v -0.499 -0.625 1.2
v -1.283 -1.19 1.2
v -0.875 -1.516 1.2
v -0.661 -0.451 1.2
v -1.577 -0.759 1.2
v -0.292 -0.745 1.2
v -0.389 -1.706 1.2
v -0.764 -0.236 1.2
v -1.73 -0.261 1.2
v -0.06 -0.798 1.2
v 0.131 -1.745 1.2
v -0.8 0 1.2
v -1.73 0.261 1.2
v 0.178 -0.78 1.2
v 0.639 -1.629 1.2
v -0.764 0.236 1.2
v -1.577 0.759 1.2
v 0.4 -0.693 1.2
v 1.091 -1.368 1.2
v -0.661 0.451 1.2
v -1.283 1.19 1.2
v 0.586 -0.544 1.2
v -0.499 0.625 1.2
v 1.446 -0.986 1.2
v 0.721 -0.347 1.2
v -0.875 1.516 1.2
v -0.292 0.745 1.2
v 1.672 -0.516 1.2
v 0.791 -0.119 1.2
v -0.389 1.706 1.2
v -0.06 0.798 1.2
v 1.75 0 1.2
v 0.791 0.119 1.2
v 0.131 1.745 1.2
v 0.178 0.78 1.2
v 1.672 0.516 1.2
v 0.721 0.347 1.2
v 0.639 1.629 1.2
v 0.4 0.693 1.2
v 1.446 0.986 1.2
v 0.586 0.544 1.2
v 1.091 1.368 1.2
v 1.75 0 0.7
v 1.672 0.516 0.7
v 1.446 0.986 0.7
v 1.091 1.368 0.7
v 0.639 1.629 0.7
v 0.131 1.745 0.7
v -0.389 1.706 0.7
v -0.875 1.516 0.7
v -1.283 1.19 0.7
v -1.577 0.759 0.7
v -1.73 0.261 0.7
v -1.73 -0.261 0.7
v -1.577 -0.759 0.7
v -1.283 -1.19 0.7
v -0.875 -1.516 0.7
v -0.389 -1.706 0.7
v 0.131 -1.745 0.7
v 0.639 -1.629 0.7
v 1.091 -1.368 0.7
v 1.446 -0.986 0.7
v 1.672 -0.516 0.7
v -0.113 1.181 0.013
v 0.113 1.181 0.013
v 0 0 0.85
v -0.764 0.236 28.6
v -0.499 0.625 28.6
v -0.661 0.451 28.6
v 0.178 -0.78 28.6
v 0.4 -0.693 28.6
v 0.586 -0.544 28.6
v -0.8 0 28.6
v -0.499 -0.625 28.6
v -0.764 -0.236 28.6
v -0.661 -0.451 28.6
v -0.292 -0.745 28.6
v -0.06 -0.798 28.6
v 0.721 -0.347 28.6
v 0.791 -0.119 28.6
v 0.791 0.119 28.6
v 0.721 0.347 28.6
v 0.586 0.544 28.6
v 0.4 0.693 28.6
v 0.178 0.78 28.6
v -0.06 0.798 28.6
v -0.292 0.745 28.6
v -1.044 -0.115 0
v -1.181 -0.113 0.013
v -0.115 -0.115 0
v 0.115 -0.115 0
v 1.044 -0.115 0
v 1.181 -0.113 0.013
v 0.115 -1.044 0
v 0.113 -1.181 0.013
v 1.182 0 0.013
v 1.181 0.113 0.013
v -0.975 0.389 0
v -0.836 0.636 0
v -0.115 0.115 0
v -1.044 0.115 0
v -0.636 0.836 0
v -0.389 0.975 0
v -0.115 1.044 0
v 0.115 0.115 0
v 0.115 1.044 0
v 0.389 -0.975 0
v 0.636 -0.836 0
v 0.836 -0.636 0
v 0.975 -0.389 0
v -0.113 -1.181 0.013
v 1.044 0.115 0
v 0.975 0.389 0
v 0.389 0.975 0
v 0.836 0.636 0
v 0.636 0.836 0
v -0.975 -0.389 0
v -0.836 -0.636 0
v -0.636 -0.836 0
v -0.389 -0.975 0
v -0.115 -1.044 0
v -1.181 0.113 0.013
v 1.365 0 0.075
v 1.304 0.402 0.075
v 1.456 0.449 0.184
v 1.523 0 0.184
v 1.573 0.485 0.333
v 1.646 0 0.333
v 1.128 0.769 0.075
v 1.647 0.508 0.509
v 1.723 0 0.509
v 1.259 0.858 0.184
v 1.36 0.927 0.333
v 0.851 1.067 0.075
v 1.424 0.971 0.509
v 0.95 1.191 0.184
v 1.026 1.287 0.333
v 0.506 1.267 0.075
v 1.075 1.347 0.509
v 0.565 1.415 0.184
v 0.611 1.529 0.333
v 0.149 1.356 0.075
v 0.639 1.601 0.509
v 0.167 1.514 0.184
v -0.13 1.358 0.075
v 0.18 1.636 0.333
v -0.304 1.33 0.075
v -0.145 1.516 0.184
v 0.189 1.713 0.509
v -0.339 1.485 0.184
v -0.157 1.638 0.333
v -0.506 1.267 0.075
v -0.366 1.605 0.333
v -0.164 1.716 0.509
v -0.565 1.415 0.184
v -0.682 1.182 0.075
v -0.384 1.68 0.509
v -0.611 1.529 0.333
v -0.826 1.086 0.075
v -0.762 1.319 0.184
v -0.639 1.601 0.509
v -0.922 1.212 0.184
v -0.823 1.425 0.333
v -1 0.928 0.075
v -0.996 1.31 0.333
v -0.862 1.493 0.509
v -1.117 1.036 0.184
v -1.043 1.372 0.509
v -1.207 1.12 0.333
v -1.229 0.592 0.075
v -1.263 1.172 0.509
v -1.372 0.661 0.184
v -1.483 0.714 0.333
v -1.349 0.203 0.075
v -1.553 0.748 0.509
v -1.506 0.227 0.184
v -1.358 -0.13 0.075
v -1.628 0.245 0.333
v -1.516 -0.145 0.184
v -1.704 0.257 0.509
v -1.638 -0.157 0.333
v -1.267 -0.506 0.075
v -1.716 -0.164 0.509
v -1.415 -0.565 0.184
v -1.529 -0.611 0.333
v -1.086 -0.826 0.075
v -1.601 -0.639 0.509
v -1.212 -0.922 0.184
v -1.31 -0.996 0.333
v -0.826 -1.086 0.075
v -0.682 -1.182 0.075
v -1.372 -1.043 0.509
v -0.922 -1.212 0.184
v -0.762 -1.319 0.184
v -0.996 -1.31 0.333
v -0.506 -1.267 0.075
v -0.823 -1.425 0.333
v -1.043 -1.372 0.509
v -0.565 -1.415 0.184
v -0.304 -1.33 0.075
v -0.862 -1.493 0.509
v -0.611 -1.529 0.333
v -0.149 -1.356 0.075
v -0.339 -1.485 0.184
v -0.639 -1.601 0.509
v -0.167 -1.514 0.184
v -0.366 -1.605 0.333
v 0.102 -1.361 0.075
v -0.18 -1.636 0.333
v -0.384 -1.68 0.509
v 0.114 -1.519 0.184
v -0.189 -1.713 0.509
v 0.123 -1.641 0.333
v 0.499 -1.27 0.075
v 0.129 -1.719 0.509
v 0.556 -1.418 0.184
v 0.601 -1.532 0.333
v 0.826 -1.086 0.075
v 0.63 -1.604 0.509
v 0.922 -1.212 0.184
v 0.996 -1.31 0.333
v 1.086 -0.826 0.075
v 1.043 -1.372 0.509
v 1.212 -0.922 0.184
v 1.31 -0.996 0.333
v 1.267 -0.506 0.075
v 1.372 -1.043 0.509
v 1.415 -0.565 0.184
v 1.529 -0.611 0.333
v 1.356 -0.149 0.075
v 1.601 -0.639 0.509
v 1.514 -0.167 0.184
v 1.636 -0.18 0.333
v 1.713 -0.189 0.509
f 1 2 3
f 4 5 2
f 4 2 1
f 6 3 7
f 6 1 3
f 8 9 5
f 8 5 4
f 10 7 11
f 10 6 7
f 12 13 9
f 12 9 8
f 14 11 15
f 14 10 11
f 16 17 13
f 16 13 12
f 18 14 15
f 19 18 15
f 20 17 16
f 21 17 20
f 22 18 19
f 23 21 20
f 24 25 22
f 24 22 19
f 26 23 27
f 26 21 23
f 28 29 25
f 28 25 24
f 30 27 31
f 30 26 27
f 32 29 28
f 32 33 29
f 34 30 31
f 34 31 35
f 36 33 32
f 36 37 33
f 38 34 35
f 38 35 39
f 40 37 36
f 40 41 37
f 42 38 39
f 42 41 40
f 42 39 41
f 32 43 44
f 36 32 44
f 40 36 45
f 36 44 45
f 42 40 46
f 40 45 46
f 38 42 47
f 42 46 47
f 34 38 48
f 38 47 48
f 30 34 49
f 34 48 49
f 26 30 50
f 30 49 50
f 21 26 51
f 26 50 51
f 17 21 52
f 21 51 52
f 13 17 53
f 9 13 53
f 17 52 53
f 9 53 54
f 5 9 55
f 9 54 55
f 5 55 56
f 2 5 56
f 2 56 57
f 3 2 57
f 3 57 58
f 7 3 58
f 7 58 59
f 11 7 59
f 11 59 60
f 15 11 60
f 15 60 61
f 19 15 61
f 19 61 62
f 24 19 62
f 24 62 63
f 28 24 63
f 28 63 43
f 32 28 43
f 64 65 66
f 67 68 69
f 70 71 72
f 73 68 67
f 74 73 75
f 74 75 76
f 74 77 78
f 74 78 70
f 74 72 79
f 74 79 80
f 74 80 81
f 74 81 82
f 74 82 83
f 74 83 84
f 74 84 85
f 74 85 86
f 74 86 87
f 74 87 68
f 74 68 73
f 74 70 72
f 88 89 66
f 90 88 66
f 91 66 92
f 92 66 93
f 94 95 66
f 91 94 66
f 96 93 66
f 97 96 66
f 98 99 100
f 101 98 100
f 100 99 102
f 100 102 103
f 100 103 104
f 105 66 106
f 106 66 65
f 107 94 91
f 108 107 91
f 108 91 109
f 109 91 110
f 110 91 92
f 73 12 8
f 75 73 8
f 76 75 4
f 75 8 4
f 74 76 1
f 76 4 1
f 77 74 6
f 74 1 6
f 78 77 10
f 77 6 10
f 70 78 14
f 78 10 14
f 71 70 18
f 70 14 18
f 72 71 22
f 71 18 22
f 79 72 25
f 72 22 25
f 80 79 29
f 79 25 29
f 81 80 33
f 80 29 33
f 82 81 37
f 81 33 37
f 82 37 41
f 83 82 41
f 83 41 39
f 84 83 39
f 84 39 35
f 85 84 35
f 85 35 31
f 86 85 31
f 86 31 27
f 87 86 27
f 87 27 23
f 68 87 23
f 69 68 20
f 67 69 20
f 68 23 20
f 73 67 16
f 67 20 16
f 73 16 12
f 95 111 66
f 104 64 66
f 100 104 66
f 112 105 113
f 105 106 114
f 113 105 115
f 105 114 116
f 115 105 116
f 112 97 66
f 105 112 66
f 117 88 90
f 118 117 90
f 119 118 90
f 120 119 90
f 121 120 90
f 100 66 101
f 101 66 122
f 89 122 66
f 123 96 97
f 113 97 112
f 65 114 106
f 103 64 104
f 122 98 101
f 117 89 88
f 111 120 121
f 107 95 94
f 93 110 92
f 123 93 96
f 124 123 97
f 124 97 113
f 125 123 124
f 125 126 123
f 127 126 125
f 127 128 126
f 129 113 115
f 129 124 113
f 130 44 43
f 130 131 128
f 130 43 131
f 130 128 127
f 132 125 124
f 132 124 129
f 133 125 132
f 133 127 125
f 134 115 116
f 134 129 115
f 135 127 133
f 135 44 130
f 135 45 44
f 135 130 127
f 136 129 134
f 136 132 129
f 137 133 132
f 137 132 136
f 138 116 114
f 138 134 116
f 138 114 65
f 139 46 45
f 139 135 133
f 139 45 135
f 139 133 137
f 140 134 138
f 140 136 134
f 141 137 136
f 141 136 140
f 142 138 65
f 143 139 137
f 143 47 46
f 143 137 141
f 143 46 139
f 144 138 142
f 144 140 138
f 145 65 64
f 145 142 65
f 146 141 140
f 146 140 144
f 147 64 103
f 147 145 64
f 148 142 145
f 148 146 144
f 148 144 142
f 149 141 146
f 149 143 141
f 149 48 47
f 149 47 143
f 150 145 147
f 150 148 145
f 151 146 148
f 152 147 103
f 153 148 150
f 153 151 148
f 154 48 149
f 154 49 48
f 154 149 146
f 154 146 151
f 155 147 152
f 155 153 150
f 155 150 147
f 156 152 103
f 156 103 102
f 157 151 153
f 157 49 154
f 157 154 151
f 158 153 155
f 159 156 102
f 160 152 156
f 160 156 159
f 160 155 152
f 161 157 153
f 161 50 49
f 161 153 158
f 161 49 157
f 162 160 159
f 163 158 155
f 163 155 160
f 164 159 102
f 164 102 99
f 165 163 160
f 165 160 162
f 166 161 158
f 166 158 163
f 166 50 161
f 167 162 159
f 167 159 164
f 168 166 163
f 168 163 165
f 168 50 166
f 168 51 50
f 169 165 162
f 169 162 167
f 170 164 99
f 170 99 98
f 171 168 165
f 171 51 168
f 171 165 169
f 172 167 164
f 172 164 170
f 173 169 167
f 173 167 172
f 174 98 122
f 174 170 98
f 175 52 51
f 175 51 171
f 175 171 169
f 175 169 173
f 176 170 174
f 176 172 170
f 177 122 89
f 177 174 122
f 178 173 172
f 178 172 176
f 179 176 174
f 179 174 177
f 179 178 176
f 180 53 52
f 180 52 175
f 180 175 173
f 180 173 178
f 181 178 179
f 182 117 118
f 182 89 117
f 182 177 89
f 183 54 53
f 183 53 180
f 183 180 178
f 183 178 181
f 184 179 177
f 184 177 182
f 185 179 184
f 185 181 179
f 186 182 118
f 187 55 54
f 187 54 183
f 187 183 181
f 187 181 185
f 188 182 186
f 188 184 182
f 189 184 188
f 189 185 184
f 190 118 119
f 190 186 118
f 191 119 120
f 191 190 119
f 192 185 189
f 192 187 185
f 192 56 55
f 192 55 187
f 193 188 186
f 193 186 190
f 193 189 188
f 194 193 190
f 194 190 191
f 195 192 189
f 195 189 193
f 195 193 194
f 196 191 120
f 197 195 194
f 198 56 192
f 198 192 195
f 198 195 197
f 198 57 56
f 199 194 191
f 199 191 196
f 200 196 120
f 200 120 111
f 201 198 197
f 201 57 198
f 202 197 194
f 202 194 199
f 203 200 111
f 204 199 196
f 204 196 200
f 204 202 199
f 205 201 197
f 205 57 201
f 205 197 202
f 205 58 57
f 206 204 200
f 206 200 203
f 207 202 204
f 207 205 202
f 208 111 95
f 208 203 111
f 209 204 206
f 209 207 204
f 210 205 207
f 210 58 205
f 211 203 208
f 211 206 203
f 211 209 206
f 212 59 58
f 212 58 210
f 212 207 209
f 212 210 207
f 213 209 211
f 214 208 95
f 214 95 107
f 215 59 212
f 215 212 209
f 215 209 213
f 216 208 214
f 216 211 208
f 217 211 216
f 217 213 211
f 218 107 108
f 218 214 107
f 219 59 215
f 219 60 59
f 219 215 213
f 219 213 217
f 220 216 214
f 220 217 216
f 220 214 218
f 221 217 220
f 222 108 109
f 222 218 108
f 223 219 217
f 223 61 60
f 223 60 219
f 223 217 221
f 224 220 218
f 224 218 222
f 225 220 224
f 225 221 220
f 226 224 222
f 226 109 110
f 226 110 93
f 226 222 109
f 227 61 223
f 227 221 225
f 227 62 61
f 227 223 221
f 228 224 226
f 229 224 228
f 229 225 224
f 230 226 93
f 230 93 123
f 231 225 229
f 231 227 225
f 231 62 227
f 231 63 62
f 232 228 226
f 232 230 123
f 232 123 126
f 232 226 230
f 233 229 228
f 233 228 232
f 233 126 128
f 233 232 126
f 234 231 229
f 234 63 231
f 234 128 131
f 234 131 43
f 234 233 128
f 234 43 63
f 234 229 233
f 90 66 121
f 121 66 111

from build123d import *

# Parameters (mm, degrees)
SKETCH_1_R               = 1.75
EXTRUDE_1_DEPTH          = 1.2
SKETCH_2_R               = 0.8
EXTRUDE_2_DEPTH          = 27.4
PATTERN_CIRCULAR_1_COUNT = 4
FILLET_2_R               = 0.7


with BuildPart() as part:
    # 草圖1 → 伸長1 (new body)
    with BuildSketch(Plane.XY):
        Circle(SKETCH_1_R)
    extrude(amount=EXTRUDE_1_DEPTH)

    # 草圖2 → 伸長2 (add)
    with BuildSketch(Plane.XY.offset(1.2)):
        with Locations(Location((0, 0, 0), (0, 0, 180))):
            Circle(SKETCH_2_R)
    extrude(amount=EXTRUDE_2_DEPTH)

    # 草圖3 → 除料-疊層拉伸1 section 0
    with BuildSketch(Plane(origin=(0, 0, 0), x_dir=(-1, 0, 0), z_dir=(0, 0, -1)), mode=Mode.PRIVATE) as loft_1_s0:
        with BuildLine():
            Line((-0.115, 1.2), (0.115, 1.2))
            Line((0.115, 1.2), (0.115, -1.2))
            Line((0.115, -1.2), (-0.115, -1.2))
            Line((-0.115, -1.2), (-0.115, 1.2))
        make_face()
    loft_1 = loft([loft_1_s0.sketch, Vertex(0, 0, 0.85)], mode=Mode.SUBTRACT)

    # 環狀複製排列1: 除料-疊層拉伸1 ×4 about axis
    pattern_circular_1_axis = Axis((0, 0, 0), (0, 0, 1))
    for i in range(1, PATTERN_CIRCULAR_1_COUNT):
        add(loft_1.rotate(pattern_circular_1_axis, i * 360 / PATTERN_CIRCULAR_1_COUNT), mode=Mode.SUBTRACT)

    # 圓角2
    # the kernel refuses this fillet: 0.7 mm, written as the material it takes off along each edge
    with BuildSketch(Plane(origin=(0, 0, 0), x_dir=(1, 0, 0), z_dir=(0, -1, 0))) as fillet_2_piece_1:
        with BuildLine():
            CenterArc((1.75 - FILLET_2_R, FILLET_2_R), FILLET_2_R, 270, 90)
            Line((1.75 - FILLET_2_R, 0), (1.75, 0))
            Line((1.75, 0), (1.75, FILLET_2_R))
        make_face()
    revolve(axis=Axis((0, 0, 0), (0, 0, 1)), mode=Mode.SUBTRACT)


solid = part.part
